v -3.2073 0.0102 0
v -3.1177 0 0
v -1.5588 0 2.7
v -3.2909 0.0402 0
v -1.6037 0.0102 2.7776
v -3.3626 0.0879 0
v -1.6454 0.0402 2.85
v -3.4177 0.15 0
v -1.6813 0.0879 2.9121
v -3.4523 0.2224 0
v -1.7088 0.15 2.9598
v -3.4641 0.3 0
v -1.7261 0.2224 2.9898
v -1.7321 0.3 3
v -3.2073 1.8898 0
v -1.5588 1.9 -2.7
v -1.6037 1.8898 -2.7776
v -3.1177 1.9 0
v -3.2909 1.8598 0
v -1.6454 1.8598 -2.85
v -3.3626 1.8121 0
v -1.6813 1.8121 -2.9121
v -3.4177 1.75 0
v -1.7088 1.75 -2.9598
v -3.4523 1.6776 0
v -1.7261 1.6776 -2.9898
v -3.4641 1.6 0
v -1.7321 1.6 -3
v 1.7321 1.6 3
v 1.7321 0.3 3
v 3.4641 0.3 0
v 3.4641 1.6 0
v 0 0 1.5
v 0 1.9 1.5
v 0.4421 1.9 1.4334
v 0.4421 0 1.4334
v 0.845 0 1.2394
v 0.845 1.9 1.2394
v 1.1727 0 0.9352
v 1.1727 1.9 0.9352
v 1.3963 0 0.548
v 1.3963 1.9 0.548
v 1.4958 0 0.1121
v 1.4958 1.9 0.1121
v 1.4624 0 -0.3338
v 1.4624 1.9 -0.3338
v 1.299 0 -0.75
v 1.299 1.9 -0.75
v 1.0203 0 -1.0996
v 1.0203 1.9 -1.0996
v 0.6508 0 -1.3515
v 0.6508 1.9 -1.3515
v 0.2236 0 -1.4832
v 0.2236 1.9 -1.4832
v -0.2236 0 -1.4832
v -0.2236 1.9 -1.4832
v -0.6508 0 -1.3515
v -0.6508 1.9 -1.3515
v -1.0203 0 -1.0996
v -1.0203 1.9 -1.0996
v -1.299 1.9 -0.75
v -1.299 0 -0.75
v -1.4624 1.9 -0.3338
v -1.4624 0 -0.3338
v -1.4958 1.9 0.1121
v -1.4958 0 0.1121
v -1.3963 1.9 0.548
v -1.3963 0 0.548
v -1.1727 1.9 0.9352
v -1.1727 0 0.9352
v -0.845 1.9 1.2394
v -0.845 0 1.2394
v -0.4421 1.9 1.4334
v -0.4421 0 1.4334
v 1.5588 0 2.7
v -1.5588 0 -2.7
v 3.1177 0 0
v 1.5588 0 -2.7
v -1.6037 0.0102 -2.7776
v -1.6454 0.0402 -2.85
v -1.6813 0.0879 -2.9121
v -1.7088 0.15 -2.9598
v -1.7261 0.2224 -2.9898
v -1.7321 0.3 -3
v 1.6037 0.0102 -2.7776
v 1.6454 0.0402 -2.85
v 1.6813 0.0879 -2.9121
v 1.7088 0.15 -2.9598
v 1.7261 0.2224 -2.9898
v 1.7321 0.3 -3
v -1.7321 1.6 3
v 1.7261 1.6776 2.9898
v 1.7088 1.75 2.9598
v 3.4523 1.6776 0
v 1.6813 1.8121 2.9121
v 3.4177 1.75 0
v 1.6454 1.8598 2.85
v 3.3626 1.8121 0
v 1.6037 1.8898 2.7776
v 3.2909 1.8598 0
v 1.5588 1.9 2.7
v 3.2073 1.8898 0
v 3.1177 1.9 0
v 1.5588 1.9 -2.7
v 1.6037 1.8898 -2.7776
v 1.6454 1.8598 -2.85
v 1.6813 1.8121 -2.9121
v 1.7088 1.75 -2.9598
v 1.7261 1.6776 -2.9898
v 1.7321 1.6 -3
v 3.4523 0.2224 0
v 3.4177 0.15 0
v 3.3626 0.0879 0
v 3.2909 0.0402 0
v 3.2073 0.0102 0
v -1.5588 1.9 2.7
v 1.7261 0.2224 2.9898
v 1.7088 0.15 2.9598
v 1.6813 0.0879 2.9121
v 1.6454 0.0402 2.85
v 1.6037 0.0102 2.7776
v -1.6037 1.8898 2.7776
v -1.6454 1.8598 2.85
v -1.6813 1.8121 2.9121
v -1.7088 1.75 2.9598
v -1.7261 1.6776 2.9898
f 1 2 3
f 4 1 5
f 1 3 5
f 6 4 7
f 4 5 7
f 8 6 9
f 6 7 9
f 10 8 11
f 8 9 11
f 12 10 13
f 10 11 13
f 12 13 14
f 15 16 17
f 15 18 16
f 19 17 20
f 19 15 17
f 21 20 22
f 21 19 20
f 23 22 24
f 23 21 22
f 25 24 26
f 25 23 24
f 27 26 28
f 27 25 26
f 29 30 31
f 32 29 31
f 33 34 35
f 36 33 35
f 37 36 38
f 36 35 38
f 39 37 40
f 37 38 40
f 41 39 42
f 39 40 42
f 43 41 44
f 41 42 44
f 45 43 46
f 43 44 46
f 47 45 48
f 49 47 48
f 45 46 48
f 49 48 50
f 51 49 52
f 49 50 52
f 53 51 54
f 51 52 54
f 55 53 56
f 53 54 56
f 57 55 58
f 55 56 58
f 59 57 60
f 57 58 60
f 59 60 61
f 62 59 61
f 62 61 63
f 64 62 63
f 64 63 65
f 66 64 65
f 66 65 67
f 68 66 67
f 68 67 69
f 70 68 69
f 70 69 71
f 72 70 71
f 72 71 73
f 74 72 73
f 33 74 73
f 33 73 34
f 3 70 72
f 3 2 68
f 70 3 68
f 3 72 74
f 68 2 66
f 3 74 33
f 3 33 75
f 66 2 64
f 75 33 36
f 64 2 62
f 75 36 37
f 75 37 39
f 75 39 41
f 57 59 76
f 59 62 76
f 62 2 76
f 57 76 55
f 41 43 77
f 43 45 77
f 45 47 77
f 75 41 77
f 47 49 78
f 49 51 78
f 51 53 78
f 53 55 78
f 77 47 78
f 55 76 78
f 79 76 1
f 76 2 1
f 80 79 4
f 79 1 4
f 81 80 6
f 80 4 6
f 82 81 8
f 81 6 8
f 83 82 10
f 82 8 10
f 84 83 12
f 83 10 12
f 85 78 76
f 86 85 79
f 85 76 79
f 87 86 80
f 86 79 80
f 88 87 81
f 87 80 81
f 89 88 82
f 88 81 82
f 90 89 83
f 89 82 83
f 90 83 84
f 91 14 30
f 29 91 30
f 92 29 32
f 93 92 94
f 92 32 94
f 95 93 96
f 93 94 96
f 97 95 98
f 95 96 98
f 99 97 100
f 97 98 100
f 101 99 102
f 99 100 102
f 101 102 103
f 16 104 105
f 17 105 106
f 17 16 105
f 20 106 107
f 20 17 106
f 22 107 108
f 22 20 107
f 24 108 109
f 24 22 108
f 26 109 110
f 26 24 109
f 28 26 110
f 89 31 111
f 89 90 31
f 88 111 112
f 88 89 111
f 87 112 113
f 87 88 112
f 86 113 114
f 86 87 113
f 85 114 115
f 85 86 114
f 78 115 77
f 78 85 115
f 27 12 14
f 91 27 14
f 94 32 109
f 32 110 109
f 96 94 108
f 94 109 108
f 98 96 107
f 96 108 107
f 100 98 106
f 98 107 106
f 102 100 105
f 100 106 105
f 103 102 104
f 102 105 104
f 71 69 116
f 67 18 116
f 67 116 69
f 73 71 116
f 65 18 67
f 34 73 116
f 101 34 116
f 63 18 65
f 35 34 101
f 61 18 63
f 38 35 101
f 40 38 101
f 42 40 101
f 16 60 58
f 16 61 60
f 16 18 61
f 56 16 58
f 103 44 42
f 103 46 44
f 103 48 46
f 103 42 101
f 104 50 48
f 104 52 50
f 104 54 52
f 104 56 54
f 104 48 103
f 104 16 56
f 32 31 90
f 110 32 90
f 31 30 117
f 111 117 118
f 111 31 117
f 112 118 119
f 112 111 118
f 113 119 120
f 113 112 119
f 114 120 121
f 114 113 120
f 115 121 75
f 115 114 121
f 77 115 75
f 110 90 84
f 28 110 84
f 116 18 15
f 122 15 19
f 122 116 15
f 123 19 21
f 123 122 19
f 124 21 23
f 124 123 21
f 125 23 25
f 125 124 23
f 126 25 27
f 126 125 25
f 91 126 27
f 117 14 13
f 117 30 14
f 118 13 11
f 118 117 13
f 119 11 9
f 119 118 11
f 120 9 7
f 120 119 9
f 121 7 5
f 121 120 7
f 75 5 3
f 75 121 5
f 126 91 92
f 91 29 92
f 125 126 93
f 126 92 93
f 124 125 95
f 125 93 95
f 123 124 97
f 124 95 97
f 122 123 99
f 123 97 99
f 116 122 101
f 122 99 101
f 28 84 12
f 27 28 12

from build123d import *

# Parameters (mm, degrees)
BOSS_EXTRUDE1_DEPTH = 1.9
SKETCH2_R           = 1.5
CUT_EXTRUDE1_DEPTH  = 2.3
FILLET1_R           = 0.3


with BuildPart() as part:
    # Sketch1 → Boss-Extrude1 (new body)
    with BuildSketch(Plane(origin=(0, 0, 0), x_dir=(1, 0, 0), z_dir=(0, 1, 0))):
        Polygon((1.732050808, -3), (3.464101615, 0), (1.732050808, 3), (-1.732050808, 3), (-3.464101615, 0), (-1.732050808, -3), align=None)
    extrude(amount=BOSS_EXTRUDE1_DEPTH)

    # Sketch2 → Cut-Extrude1 (cut)
    with BuildSketch(Plane(origin=(0, 1.9, 0), x_dir=(1, 0, 0), z_dir=(0, 1, 0))):
        with Locations(Location((0, 0, 0), (0, 0, 270))):
            Circle(SKETCH2_R)
    extrude(amount=-CUT_EXTRUDE1_DEPTH, mode=Mode.SUBTRACT)

    # Fillet1
    fillet1_edges = [part.edges().sort_by_distance(p)[0] for p in [
        (2.598076211, 1.9, -1.5),
        (0, 1.9, -3),
        (-2.598076211, 1.9, -1.5),
        (-2.598076211, 1.9, 1.5),
        (0, 1.9, 3),
        (-2.598076211, 0, 1.5),
        (-2.598076211, 0, -1.5),
        (0, 0, -3),
        (2.598076211, 0, -1.5),
        (2.598076211, 0, 1.5),
        (0, 0, 3),
        (2.598076211, 1.9, 1.5),
    ]]
    fillet(fillet1_edges, radius=FILLET1_R)


solid = part.part
